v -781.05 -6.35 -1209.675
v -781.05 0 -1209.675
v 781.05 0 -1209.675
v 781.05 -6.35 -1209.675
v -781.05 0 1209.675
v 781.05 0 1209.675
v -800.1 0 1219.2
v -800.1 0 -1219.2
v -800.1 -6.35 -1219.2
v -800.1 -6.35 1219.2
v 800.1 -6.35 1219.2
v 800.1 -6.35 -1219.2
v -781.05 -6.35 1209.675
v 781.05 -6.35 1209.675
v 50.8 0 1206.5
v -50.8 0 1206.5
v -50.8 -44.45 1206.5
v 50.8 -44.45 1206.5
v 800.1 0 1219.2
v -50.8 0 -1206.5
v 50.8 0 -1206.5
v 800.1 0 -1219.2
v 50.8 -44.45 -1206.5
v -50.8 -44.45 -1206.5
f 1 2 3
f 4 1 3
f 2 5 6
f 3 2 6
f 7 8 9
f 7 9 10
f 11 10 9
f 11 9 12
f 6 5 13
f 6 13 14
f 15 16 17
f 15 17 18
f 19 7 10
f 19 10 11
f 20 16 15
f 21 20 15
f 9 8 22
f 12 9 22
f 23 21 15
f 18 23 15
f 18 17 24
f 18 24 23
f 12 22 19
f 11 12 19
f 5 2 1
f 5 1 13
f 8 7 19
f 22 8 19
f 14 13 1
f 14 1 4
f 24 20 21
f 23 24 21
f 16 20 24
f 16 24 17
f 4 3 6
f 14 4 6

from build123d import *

# Parameters (mm, degrees)
F0_W     = 1600.2
F0_H     = 2438.4
F1_DEPTH = 6.35
F2_W     = 101.6
F2_H     = 2413
F3_DEPTH = 44.45
F4_W     = 1562.1
F4_H     = 2419.35
F5_DEPTH = 6.35


with BuildPart() as f1:
    # F0 (on Front) → F1 (new body)
    with BuildSketch(Plane.XZ):
        Rectangle(F0_W, F0_H)
    extrude(amount=F1_DEPTH)


with BuildPart() as f3:
    # F2 (on Front) → F3 (new body)
    with BuildSketch(Plane.XZ):
        Rectangle(F2_W, F2_H)
    extrude(amount=F3_DEPTH)


with BuildPart() as f5:
    # F4 (on Front) → F5 (new body)
    with BuildSketch(Plane.XZ):
        Rectangle(F4_W, F4_H)
    extrude(amount=F5_DEPTH)


solid = Compound([f1.part, f3.part, f5.part])
